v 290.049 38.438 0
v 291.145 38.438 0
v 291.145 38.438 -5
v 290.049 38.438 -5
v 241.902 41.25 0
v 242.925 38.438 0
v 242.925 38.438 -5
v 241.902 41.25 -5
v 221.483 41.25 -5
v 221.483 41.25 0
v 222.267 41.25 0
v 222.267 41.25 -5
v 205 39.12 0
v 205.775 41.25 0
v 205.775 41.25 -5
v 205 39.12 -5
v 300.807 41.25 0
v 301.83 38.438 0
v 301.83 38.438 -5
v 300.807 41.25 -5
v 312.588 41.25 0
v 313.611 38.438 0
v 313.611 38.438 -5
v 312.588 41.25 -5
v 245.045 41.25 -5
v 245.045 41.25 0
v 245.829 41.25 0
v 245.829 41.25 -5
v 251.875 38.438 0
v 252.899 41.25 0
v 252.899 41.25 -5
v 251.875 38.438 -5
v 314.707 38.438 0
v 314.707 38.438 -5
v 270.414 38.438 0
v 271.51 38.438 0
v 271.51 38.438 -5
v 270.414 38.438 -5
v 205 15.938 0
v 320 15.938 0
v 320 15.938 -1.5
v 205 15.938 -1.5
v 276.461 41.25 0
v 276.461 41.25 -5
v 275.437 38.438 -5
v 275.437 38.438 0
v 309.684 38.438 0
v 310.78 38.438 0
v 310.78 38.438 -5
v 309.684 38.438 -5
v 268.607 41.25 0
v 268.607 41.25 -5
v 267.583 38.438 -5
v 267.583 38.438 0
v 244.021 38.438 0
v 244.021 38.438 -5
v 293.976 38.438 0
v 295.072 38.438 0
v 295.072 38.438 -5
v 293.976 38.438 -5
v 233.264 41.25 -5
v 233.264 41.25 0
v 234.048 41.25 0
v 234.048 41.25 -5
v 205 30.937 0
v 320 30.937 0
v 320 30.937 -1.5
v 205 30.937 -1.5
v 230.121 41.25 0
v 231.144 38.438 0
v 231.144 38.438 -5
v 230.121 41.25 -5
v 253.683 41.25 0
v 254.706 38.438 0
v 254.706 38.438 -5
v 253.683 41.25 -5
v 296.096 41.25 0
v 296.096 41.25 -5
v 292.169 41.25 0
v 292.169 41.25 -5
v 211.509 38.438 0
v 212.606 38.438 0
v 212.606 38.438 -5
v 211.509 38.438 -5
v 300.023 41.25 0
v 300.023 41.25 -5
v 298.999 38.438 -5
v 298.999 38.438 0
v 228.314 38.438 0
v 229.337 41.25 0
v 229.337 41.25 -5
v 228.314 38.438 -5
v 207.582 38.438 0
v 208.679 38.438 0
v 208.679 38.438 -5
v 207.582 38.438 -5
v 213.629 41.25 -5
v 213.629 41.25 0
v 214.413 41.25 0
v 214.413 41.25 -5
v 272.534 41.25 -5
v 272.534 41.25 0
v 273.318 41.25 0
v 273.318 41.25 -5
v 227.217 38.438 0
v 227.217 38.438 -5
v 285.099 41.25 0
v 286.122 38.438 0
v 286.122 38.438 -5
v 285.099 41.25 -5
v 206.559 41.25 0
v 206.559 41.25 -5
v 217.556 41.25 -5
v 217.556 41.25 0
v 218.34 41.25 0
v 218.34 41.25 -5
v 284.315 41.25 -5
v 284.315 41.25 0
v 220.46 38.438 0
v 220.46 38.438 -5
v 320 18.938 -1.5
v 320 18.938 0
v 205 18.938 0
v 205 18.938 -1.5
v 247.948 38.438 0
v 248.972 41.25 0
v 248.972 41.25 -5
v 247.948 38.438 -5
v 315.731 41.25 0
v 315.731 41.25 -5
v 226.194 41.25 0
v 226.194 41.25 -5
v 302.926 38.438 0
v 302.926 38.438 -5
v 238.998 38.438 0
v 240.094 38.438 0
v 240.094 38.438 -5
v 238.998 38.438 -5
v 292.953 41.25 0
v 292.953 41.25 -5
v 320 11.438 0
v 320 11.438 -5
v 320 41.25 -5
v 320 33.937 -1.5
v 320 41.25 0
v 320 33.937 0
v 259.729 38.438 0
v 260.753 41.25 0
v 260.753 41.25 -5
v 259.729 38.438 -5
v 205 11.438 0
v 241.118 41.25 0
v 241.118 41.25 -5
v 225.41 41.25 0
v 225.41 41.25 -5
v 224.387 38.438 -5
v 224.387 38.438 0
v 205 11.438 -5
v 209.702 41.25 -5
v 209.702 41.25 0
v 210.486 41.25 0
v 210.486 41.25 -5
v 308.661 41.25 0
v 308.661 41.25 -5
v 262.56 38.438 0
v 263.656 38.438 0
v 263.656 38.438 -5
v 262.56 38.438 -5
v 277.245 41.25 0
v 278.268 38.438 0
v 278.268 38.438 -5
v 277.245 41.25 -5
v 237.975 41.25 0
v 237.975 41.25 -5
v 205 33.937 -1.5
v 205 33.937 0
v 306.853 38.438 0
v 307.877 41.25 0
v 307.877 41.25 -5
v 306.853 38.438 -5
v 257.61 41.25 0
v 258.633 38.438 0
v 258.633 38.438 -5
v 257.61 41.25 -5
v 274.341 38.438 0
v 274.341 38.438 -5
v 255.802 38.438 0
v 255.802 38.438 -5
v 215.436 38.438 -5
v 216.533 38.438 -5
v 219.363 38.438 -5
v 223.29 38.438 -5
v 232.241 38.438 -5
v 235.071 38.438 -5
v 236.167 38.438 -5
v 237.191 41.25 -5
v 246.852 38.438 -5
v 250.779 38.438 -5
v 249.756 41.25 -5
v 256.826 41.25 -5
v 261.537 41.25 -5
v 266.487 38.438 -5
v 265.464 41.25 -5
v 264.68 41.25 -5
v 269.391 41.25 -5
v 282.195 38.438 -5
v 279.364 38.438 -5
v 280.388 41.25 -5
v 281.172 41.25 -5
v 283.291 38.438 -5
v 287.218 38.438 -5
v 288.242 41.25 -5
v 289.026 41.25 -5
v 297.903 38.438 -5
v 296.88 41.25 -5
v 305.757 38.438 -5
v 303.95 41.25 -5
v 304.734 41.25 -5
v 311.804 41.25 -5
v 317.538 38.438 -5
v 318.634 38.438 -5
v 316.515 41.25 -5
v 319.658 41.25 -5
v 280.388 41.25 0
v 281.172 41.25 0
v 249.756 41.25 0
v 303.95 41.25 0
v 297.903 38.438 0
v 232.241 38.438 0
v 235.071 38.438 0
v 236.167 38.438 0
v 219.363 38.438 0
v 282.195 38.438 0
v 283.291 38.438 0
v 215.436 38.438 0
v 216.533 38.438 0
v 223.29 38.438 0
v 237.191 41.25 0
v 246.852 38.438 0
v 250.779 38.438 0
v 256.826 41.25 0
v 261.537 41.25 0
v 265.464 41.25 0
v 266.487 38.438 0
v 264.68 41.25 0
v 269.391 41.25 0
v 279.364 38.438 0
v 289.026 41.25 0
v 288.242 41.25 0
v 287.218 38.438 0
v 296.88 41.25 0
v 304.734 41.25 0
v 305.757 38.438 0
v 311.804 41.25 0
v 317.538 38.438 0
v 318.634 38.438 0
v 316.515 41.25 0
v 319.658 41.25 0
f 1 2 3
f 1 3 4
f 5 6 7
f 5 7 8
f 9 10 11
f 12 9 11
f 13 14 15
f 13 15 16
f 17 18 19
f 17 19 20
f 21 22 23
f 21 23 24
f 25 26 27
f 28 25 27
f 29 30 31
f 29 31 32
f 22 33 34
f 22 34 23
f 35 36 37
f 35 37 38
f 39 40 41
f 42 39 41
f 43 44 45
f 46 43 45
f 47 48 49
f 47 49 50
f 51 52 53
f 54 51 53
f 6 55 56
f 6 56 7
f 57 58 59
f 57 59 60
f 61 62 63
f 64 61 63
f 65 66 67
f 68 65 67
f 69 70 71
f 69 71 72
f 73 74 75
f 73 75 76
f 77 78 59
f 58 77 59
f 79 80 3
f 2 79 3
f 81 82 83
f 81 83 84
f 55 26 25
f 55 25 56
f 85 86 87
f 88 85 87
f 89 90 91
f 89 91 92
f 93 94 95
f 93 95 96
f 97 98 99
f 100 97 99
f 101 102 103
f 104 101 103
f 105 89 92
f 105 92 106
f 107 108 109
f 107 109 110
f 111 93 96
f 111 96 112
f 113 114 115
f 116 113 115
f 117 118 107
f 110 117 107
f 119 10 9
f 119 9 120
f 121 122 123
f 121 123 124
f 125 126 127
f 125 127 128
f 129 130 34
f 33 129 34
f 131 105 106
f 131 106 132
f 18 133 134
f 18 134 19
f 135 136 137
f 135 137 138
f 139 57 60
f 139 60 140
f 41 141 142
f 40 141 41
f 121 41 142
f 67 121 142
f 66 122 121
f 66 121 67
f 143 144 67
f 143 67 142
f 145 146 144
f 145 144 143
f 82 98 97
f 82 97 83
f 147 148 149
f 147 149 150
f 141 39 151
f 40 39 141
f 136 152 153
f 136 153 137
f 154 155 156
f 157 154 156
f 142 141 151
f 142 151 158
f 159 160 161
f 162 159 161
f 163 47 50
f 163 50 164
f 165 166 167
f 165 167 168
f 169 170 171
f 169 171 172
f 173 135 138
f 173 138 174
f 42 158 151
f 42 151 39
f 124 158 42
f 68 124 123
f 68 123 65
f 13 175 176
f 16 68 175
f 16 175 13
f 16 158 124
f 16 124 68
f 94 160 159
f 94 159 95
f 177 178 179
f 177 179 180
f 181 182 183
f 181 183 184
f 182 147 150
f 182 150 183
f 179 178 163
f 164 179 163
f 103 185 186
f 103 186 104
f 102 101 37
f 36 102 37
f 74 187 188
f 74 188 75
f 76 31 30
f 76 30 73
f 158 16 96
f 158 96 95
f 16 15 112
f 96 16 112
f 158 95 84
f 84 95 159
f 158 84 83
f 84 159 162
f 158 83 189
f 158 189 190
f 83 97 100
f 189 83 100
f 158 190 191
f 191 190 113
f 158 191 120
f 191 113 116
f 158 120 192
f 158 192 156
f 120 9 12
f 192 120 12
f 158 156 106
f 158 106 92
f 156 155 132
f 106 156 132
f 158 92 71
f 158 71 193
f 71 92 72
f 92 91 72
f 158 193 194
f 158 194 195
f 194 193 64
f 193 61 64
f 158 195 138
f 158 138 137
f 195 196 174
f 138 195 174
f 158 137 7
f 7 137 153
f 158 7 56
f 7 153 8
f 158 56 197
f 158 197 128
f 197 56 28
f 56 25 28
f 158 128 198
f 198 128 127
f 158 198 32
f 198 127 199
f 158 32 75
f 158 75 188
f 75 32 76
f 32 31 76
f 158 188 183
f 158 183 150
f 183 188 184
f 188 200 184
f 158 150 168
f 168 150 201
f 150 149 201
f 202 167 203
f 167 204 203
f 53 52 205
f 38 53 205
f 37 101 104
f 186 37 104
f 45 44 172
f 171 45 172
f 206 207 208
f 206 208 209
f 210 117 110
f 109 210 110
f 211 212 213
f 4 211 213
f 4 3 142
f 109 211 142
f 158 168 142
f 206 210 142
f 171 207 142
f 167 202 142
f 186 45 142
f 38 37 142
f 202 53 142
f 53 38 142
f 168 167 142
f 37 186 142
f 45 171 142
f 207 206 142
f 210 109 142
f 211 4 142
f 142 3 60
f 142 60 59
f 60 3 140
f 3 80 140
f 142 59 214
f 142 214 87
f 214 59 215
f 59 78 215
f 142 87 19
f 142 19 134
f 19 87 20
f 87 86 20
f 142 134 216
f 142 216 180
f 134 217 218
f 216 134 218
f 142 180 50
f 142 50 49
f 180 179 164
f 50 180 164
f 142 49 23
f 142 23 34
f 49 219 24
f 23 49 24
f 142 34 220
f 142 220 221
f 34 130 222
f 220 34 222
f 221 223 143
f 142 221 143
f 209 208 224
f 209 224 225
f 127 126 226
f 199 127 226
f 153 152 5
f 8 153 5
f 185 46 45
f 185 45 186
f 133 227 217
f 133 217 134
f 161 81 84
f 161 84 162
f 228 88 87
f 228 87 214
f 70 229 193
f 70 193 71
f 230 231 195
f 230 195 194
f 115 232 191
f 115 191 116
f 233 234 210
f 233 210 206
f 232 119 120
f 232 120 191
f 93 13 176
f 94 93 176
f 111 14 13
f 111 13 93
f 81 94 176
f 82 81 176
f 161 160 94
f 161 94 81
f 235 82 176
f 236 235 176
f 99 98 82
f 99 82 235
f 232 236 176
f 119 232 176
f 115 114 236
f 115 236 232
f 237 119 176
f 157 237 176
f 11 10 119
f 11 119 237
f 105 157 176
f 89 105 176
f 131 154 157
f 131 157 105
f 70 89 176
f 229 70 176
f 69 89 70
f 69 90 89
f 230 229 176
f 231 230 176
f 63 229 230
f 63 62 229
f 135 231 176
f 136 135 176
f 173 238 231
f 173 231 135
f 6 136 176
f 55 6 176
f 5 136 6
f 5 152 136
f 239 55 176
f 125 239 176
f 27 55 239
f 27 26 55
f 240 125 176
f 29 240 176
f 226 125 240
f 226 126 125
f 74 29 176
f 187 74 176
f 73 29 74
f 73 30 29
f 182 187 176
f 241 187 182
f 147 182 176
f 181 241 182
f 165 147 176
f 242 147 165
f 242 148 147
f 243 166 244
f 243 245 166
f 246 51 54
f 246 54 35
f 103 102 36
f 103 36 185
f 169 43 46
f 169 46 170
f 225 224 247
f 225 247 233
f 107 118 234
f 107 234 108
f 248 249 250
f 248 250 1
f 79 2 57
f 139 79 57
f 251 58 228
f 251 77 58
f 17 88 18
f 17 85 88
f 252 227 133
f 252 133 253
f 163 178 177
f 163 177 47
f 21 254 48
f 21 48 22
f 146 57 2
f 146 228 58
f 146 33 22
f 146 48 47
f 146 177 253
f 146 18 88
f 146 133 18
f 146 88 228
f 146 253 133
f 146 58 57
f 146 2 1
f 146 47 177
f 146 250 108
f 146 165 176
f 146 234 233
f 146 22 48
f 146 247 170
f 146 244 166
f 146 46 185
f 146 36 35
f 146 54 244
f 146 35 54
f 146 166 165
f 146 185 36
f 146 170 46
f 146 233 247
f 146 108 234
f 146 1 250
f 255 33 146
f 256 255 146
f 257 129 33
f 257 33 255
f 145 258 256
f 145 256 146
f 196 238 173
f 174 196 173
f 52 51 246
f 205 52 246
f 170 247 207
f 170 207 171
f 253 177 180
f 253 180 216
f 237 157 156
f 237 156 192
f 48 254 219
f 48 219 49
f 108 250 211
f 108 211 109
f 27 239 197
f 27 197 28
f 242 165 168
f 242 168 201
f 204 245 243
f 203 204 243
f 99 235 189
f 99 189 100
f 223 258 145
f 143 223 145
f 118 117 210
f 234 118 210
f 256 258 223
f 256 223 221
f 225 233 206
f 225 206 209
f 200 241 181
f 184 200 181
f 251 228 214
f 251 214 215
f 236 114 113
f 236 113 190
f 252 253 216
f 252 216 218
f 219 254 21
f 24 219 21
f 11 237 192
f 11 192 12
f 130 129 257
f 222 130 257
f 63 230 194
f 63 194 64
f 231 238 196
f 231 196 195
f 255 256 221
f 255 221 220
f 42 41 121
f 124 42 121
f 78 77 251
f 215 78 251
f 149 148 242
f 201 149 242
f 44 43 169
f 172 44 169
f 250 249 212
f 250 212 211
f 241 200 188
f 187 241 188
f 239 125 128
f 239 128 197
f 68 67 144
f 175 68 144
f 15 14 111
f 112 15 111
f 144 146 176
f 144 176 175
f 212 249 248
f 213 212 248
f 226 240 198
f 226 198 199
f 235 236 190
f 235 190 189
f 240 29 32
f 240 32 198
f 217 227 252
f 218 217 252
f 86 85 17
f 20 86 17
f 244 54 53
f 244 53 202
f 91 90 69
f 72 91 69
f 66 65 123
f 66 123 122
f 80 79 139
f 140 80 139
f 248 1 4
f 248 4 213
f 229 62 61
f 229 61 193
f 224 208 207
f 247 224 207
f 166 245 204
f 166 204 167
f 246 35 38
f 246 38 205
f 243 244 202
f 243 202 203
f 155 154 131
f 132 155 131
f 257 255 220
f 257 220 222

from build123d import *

# Parameters (mm, degrees)
BLANKSKE_W                    = 320
BLANKSKE_H                    = 41.25
BLANK_DEPTH                   = 5
TOOTHCUTSIM_DEPTH             = 323.686477095
TEETHCUTS_COUNT               = 83
TEETHCUTS_PITCH               = 3.926990813
SCHIZZO4_W                    = 5
SCHIZZO4_H                    = 11.438
TAGLIO_ESTRUSIONE1_DEPTH      = 359
SCHIZZO5_W                    = 1.5
SCHIZZO5_H                    = 3
TAGLIO_ESTRUSIONE2_DEPTH      = 323.686477095
TAGLIO_ESTRUSIONE3_DEPTH      = 10
TAGLIO_ESTRUSIONE3_DEPTH_BACK = 10
SCHIZZO6_OUTSIDE_W            = 386.284
SCHIZZO6_OUTSIDE_H            = 96.096
SCHIZZO6_OUTSIDE_W_2          = 115
SCHIZZO6_OUTSIDE_H_2          = 29.812


with BuildPart() as part:
    # BlankSke → Blank (new body)
    with BuildSketch(Plane.XY):
        with Locations((160, 20.625)):
            Rectangle(BLANKSKE_W, BLANKSKE_H)
    extrude(amount=-BLANK_DEPTH)

    # TooCutSkeSim → ToothCutSim (cut, through all)
    with BuildSketch(Plane.XY):
        Polygon((0.548044212, 38.4375), (-0.548044212, 38.4375), (-1.58095534, 41.2754), (1.58095534, 41.2754), align=None)
    toothcutsim = extrude(amount=-TOOTHCUTSIM_DEPTH, mode=Mode.SUBTRACT)

    # TeethCuts: ToothCutSim ×83
    with Locations(*[(i * TEETHCUTS_PITCH, 0, 0) for i in range(1, TEETHCUTS_COUNT)]):
        add(toothcutsim, mode=Mode.SUBTRACT)

    # Schizzo4 → Taglio-Estrusione1 (cut)
    with BuildSketch(Plane(origin=(320, 0, 0), x_dir=(0, 0, -1), z_dir=(1, 0, 0))):
        with Locations((2.5, 5.719)):
            Rectangle(SCHIZZO4_W, SCHIZZO4_H)
    extrude(amount=-TAGLIO_ESTRUSIONE1_DEPTH, mode=Mode.SUBTRACT)

    # Schizzo5 → Taglio-Estrusione2 (cut, through all)
    with BuildSketch(Plane(origin=(320, 0, 0), x_dir=(0, 0, -1), z_dir=(1, 0, 0))):
        with Locations((0.75, 32.437)):
            Rectangle(SCHIZZO5_W, SCHIZZO5_H)
        with Locations((0.75, 17.438)):
            Rectangle(SCHIZZO5_W, SCHIZZO5_H)
    extrude(amount=-TAGLIO_ESTRUSIONE2_DEPTH, mode=Mode.SUBTRACT)

    # Schizzo6 outside → Taglio-Estrusione3 (cut, two sides: drawn at the far end of the back side and taken through both)
    with BuildSketch(Plane(origin=(0, 0, -5), x_dir=(-1, 0, 0), z_dir=(0, 0, -1)).offset(-TAGLIO_ESTRUSIONE3_DEPTH_BACK)):
        with Locations((-160, 26.344)):
            Rectangle(SCHIZZO6_OUTSIDE_W, SCHIZZO6_OUTSIDE_H)
        with Locations((-262.5, 26.344)):
            Rectangle(SCHIZZO6_OUTSIDE_W_2, SCHIZZO6_OUTSIDE_H_2, mode=Mode.SUBTRACT)
    extrude(amount=TAGLIO_ESTRUSIONE3_DEPTH + TAGLIO_ESTRUSIONE3_DEPTH_BACK, mode=Mode.SUBTRACT)


solid = part.part
